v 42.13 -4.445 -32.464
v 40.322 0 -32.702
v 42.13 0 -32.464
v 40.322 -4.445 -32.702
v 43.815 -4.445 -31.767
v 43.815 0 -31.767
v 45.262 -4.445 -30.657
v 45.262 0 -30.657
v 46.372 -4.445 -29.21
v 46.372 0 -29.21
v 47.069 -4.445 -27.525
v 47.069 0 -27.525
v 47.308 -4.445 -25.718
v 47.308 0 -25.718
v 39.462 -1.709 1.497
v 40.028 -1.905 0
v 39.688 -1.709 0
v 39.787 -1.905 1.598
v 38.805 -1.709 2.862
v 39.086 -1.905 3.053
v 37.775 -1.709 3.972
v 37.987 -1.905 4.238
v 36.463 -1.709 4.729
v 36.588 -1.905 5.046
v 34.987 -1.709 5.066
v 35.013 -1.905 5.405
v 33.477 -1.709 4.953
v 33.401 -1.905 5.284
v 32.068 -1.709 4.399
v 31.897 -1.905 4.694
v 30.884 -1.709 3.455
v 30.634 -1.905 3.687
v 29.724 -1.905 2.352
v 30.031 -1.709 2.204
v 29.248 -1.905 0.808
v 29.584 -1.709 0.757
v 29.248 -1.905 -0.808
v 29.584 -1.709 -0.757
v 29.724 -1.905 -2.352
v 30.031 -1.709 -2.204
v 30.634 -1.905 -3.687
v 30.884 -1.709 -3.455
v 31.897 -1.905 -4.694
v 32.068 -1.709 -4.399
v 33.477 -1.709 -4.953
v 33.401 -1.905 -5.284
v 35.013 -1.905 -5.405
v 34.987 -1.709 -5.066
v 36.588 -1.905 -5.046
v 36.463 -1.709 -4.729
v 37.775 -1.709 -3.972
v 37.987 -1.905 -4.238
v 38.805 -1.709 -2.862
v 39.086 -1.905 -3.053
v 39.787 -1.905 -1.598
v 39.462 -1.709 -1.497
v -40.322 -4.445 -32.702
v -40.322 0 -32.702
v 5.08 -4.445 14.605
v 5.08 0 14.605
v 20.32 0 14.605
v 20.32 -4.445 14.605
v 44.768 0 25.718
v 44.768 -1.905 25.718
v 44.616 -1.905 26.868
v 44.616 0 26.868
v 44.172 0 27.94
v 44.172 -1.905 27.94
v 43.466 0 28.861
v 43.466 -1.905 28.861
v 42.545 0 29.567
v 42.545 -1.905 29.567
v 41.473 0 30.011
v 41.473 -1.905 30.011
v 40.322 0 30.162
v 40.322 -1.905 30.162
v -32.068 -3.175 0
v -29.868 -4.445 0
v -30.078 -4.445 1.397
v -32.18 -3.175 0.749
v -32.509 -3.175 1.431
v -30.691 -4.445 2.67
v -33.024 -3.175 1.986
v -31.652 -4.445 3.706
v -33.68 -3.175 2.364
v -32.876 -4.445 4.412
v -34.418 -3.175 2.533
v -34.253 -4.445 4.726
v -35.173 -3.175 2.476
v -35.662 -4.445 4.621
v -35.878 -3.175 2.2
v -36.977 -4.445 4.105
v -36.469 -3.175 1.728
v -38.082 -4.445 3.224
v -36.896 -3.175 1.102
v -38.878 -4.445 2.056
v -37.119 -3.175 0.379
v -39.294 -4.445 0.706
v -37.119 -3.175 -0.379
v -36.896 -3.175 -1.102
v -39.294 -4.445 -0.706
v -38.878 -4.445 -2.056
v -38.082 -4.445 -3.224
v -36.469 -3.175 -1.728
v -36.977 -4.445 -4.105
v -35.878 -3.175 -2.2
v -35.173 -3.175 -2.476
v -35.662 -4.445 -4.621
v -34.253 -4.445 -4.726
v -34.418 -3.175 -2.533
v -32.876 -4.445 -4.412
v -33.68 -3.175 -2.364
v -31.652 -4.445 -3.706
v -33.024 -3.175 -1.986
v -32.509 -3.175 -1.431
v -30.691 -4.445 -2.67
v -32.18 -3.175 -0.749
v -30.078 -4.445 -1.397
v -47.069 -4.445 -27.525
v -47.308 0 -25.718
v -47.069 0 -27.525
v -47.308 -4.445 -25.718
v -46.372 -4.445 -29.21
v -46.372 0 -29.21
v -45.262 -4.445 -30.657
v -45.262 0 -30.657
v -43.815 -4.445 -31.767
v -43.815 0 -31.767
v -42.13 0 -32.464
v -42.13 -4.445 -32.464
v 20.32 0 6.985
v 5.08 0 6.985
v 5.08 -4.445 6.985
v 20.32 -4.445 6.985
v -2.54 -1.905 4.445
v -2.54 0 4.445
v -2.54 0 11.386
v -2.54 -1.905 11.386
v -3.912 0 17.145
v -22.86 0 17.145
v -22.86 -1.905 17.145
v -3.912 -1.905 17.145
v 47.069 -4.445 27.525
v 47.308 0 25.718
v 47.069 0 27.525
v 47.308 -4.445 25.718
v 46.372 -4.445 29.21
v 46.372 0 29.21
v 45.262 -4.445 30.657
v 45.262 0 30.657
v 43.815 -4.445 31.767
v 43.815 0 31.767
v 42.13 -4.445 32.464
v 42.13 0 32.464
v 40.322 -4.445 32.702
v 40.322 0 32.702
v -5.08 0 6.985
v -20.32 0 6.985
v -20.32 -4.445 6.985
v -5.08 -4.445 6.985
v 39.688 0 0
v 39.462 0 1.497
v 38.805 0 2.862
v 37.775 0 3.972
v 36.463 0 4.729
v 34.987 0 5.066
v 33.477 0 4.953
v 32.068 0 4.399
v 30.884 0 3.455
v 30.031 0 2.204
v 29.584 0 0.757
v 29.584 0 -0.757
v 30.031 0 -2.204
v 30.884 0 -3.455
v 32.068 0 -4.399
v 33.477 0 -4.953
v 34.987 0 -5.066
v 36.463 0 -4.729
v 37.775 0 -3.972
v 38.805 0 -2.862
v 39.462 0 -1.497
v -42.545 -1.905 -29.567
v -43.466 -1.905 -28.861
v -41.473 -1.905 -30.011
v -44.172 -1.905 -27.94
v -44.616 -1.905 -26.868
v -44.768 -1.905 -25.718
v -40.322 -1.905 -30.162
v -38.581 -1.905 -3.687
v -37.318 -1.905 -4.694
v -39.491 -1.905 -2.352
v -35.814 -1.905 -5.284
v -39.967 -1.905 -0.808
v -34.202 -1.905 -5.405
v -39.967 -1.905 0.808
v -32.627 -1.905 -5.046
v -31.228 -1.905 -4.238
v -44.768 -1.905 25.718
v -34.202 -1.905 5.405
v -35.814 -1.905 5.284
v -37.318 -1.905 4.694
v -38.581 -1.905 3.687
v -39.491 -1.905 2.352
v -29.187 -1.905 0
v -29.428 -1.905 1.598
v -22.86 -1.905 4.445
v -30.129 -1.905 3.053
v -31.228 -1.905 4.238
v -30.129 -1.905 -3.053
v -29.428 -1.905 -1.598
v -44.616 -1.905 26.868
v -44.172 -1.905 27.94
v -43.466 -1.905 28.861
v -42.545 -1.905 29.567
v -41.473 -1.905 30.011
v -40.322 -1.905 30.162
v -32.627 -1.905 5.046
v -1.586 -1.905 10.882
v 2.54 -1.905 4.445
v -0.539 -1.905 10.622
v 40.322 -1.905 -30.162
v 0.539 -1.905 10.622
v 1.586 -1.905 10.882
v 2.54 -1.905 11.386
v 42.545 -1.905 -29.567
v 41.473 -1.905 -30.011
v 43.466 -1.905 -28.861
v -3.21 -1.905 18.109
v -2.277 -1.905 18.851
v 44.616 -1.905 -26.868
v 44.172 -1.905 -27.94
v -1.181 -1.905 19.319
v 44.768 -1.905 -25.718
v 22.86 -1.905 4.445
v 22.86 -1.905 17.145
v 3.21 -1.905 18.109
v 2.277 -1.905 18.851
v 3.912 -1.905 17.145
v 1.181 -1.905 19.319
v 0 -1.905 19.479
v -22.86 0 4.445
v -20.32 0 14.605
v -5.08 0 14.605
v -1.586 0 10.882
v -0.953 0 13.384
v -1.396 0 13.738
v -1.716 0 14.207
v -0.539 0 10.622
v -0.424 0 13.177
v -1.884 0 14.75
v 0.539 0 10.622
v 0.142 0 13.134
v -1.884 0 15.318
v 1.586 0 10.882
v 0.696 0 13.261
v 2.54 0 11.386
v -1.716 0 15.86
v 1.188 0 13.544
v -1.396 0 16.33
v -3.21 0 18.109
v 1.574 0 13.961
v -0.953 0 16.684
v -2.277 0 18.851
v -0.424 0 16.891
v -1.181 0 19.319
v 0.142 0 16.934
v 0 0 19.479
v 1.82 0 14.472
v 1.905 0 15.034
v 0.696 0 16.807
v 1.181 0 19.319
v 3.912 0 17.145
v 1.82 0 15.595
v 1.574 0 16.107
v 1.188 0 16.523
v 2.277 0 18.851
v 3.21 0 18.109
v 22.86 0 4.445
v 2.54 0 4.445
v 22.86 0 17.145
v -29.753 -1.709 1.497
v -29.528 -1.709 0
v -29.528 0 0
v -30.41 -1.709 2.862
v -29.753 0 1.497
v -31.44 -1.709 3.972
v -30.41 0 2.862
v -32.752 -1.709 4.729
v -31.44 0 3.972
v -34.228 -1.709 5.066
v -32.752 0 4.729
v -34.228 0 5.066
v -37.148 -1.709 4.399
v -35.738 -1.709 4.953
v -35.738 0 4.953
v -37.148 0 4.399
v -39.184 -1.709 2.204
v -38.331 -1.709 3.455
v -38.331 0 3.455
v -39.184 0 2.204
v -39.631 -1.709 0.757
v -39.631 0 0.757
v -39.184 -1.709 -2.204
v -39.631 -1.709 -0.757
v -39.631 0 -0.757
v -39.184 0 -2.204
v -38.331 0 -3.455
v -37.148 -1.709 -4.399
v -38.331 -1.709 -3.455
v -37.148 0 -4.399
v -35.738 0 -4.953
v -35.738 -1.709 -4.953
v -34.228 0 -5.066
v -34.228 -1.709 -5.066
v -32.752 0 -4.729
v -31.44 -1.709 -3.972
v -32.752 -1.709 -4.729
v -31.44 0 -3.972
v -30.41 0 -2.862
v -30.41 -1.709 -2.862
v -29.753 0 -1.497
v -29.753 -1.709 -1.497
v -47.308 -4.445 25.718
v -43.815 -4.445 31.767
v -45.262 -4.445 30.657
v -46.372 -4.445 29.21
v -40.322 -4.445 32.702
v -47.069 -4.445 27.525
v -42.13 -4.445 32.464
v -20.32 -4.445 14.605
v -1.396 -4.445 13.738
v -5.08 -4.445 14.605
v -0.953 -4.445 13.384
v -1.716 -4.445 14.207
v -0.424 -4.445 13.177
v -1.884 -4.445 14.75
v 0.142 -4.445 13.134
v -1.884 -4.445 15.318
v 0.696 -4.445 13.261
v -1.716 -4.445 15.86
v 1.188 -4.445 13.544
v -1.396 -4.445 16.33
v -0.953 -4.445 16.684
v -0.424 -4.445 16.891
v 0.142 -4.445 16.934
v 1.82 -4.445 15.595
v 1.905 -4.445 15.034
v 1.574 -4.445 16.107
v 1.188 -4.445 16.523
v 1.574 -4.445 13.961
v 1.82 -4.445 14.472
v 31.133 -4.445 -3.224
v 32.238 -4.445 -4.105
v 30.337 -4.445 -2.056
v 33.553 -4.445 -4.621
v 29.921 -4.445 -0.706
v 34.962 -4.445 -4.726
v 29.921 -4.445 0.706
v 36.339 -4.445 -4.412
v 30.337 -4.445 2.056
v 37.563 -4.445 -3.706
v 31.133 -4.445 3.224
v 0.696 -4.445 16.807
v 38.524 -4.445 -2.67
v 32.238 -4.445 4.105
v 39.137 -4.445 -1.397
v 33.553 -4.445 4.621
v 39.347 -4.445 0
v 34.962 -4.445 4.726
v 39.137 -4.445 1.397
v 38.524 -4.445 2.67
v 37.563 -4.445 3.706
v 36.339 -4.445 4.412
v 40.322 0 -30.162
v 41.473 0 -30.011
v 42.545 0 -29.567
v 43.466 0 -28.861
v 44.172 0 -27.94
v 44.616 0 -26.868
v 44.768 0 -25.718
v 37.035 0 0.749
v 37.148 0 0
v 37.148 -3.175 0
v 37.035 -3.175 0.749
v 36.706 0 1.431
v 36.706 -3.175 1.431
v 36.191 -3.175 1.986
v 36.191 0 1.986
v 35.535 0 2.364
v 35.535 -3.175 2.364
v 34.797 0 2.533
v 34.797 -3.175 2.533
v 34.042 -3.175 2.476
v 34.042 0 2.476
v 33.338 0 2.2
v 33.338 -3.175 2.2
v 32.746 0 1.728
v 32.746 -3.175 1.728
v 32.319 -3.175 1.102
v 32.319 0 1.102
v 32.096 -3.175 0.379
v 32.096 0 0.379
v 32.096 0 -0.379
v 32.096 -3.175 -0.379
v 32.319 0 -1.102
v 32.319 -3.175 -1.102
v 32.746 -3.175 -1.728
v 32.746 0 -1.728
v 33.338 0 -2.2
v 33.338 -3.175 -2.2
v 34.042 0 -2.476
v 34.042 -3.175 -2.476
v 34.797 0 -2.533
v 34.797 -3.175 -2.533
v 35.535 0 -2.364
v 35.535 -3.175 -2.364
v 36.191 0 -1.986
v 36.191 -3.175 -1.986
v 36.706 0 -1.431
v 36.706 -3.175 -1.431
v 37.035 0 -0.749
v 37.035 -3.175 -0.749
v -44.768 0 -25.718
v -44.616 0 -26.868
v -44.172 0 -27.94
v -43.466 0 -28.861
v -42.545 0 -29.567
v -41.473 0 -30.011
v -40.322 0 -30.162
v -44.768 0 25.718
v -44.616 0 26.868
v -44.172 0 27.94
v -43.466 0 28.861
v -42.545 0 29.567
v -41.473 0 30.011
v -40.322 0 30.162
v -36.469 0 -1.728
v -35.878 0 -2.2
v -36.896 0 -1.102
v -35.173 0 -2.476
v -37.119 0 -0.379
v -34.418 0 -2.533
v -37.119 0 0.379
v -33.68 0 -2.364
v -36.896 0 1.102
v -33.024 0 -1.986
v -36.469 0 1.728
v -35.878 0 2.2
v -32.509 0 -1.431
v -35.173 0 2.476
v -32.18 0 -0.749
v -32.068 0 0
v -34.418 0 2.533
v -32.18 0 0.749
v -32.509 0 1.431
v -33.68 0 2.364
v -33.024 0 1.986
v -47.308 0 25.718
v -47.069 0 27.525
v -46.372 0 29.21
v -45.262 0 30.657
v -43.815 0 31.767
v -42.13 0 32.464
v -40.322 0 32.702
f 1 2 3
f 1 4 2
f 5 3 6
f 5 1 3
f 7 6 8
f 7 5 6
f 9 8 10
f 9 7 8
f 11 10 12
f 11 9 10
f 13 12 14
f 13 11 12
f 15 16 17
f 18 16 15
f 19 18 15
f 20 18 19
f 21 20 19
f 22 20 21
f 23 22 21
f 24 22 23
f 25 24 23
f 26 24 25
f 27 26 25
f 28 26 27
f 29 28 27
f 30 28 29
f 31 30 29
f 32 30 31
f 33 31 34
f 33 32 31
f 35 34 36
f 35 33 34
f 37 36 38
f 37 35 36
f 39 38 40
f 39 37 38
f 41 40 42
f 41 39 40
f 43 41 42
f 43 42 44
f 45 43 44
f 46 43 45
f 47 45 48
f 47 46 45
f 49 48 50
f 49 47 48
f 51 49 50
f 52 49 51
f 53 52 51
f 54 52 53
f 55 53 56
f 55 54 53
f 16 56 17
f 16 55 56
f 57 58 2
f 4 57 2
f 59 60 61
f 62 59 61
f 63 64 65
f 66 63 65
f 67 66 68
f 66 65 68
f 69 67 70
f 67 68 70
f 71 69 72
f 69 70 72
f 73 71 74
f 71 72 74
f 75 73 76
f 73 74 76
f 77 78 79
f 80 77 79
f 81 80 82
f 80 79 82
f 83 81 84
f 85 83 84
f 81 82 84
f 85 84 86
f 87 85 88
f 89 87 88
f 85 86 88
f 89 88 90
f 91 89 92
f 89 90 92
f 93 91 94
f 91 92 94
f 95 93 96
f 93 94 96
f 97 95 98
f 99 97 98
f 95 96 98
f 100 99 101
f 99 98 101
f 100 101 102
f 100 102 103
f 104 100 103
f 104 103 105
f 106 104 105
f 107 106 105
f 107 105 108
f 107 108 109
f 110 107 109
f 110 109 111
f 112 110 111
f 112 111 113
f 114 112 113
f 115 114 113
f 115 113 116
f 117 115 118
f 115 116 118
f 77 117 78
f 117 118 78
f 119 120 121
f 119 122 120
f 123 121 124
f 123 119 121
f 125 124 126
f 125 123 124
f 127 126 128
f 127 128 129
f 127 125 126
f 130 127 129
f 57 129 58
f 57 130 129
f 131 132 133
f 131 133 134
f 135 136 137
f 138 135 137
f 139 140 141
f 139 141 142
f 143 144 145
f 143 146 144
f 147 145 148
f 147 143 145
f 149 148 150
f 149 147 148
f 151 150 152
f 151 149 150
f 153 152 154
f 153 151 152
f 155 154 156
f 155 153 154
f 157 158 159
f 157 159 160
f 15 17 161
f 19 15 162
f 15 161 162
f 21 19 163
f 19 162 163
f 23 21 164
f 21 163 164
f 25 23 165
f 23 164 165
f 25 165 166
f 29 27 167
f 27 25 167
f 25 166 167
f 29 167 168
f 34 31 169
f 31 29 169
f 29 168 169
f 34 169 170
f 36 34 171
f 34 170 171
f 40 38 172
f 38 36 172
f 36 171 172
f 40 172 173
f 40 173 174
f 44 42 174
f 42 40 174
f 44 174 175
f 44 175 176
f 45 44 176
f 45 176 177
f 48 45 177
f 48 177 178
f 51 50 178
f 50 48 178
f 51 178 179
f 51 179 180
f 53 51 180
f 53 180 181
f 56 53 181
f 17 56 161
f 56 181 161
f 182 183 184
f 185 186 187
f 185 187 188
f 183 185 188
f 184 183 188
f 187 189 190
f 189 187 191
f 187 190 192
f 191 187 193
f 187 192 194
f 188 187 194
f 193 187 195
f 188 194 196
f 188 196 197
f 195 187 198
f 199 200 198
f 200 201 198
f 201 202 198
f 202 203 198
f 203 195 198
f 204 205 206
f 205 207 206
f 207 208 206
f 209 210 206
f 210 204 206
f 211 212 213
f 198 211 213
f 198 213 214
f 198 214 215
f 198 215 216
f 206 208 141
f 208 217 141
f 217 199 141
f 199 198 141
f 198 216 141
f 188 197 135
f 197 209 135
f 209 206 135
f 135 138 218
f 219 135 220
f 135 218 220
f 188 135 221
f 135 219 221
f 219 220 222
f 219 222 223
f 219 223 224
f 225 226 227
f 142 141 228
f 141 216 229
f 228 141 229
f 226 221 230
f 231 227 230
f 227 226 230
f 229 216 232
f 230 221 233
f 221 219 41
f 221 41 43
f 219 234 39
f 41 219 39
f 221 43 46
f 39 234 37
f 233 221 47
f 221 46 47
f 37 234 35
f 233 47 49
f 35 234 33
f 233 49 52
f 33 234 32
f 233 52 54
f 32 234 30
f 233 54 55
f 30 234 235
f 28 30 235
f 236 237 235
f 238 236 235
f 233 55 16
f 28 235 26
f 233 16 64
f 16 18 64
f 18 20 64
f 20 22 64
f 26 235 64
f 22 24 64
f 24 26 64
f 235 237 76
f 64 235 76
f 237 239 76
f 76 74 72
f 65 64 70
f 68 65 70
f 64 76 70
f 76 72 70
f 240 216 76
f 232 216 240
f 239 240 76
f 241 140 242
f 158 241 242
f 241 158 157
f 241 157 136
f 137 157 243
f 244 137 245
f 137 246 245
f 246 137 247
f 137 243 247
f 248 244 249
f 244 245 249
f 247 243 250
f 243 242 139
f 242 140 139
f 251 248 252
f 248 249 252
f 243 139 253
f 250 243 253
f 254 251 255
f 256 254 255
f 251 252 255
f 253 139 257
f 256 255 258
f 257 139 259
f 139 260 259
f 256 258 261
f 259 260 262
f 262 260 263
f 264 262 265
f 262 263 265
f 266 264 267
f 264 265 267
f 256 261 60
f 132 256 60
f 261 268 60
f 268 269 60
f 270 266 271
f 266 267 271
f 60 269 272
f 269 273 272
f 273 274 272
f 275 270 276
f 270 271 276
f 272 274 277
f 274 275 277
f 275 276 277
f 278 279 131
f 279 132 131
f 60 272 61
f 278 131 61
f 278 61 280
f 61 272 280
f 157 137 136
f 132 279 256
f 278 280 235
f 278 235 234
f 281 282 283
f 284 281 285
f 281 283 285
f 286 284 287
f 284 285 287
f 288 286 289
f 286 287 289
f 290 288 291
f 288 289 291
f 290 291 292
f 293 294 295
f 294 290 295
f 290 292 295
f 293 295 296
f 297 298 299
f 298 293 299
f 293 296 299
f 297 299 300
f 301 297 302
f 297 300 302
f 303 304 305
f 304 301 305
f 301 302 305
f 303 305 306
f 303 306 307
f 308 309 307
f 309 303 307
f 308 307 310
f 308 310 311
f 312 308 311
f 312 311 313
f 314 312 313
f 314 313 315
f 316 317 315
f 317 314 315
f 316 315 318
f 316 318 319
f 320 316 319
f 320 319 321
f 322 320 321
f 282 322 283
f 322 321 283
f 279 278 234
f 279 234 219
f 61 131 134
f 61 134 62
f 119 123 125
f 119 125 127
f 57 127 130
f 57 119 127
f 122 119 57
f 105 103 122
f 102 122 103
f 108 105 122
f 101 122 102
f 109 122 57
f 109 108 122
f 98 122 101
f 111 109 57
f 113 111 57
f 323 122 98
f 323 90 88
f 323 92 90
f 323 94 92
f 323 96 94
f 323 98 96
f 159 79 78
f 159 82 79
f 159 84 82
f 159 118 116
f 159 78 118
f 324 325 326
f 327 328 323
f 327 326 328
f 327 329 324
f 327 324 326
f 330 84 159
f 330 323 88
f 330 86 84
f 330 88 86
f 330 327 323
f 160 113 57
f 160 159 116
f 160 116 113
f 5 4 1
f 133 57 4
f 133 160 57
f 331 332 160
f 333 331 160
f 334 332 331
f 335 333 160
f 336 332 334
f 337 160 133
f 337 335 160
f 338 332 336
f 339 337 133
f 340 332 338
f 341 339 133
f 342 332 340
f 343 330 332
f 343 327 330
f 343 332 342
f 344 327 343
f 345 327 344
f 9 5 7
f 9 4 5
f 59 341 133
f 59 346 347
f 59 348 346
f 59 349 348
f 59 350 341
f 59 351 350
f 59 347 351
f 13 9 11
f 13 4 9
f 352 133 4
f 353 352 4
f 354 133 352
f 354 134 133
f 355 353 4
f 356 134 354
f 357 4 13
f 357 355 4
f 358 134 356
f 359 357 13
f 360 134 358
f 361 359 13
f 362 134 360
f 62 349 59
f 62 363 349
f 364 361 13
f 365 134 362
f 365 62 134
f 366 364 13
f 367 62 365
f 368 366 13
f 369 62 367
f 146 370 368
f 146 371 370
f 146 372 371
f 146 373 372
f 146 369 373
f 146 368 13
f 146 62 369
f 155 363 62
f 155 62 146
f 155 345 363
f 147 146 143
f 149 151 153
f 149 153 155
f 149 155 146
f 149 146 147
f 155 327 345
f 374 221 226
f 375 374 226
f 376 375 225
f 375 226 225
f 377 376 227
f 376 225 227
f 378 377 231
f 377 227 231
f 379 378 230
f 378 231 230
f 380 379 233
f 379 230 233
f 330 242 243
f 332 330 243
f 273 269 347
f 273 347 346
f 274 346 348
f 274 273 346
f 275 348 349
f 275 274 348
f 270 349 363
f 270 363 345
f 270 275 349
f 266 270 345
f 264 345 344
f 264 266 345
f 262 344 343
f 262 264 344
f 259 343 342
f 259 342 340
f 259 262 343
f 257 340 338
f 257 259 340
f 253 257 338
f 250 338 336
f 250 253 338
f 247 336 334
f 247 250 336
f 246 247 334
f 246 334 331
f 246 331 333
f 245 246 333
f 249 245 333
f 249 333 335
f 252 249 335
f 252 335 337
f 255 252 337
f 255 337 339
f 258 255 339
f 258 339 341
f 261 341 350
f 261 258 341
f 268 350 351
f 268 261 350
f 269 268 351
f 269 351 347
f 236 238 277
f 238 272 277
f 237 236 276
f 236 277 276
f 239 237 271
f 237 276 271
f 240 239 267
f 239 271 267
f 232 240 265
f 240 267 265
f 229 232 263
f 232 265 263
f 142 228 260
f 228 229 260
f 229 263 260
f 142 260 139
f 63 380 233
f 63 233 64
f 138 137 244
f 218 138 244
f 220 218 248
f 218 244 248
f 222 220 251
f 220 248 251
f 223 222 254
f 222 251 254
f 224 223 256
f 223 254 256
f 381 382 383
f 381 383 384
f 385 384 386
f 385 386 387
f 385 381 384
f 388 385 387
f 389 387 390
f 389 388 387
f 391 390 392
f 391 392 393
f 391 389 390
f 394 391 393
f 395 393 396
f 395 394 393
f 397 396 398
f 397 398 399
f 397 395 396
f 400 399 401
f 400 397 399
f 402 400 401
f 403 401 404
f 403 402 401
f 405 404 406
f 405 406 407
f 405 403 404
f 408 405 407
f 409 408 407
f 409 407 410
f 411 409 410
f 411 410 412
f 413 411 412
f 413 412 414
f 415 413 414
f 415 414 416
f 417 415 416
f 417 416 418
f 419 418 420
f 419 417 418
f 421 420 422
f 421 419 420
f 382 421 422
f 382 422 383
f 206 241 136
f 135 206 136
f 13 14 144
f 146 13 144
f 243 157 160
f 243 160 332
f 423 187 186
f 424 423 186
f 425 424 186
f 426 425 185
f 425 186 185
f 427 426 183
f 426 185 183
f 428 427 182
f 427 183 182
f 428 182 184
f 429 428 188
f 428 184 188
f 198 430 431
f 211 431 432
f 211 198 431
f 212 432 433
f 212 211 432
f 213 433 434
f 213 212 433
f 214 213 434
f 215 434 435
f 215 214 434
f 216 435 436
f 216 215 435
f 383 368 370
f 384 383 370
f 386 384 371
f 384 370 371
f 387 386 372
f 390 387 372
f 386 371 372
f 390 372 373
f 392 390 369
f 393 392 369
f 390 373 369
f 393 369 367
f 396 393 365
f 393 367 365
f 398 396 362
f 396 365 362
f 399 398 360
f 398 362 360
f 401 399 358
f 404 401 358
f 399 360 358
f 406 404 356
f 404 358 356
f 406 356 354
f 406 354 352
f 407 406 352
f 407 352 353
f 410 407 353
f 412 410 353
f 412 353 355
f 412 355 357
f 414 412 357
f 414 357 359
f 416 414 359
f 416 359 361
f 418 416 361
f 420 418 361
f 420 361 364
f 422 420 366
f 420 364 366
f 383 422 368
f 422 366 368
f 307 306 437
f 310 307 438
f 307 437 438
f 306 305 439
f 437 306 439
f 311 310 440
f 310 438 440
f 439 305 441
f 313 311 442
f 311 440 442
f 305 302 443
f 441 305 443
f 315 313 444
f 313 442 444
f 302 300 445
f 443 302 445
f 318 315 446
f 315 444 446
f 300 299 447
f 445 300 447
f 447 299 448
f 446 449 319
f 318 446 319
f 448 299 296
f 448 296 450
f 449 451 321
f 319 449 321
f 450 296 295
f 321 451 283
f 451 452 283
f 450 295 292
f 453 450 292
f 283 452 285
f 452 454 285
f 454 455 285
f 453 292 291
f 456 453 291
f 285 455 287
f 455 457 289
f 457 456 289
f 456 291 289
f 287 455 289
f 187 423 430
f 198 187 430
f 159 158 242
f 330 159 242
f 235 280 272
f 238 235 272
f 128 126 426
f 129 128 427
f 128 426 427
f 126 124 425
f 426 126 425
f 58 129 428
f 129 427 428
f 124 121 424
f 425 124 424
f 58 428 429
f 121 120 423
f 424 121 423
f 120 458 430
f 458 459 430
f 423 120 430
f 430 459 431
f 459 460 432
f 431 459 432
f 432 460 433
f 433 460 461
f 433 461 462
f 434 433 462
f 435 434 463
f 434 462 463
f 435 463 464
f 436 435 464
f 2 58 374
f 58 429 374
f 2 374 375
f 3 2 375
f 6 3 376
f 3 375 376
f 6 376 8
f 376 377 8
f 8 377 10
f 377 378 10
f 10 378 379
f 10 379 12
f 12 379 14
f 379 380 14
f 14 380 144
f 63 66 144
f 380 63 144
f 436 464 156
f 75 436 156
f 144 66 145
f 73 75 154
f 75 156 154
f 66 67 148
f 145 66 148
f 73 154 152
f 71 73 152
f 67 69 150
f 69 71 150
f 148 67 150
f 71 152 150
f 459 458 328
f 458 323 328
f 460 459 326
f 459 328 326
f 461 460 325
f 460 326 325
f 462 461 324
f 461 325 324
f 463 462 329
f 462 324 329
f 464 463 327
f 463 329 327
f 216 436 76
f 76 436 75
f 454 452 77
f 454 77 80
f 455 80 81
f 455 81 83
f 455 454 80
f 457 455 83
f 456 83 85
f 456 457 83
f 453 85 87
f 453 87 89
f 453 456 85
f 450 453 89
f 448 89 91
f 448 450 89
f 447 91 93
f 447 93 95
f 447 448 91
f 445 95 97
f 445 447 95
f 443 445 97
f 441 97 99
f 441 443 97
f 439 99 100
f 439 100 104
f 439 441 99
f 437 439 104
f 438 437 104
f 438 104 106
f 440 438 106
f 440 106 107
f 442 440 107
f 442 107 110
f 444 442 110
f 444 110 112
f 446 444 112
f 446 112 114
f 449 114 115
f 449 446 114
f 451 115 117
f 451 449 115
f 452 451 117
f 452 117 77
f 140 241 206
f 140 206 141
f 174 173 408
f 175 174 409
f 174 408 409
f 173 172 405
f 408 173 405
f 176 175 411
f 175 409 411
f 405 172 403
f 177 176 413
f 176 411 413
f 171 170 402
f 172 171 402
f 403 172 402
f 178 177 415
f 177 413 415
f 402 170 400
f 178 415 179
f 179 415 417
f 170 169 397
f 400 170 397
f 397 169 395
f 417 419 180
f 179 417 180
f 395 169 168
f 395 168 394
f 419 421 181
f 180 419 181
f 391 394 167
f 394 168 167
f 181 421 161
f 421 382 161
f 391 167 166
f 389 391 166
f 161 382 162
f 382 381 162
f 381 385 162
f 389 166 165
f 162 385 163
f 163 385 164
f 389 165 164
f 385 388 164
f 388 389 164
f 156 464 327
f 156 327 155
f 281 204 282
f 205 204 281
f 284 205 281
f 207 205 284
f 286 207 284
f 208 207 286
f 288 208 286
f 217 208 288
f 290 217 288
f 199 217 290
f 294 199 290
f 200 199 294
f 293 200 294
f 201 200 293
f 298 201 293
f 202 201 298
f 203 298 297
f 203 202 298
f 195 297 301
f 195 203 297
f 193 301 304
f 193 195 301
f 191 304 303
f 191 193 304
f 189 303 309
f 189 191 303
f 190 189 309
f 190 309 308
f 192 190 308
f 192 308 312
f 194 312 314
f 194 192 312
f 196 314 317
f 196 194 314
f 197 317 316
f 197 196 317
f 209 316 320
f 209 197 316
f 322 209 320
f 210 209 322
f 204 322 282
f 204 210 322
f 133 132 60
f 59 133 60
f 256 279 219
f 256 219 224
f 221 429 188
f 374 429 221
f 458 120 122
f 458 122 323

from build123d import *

# Parameters (mm, degrees)
F0_W        = 94.615
F0_H        = 65.405
F0_W_2      = 86.9950006521
F0_H_2      = 57.7850006521
F0_R        = 5.08
F0_R_2      = 2.413
F0_W_3      = 15.24
F0_H_3      = 7.62
F0_R_3      = 1.905
F0_R_4      = 2.54
F0_R_5      = 1.143
F0_W_4      = 7.112
F0_H_4      = 1.016
F1_DEPTH    = 4.445
F2_R        = 6.985
F3_SIZE2    = 2.1997045256
F3_SIZE     = 1.27
F3_2_SIZE2  = 2.1997045256
F3_2_SIZE   = 1.27
F4_T        = 2.54
F4_T3_DEPTH = 9.525


# Not quite as in the source:
# - a shell that OpenCascade refuses in one call is made with other operations: the cavity is built on its own and cut out


with BuildPart() as f1:
    # F0 (on Front) → F1 (new body)
    with BuildSketch(Plane.XZ):
        Rectangle(F0_W, F0_H)
        Rectangle(F0_W_2, F0_H_2, mode=Mode.SUBTRACT)
        Rectangle(F0_W_2, F0_H_2)
        with Locations((-34.6075, 0)):
            Circle(F0_R, mode=Mode.SUBTRACT)
        Polygon((24.765, 23.495), (24.765, -23.495), (3.556, -23.495), (-3.556, -23.495), (-24.765, -23.495), (-24.765, 23.495), align=None, mode=Mode.SUBTRACT)
        with Locations((34.6075, 0)):
            Circle(F0_R, mode=Mode.SUBTRACT)
        Polygon((-3.556, -22.479), (3.556, -22.479), (23.749, -22.479), (23.749, 22.479), (-23.749, 22.479), (-23.749, -22.479), align=None)
        with Locations((-19.685, -18.0975)):
            Circle(F0_R_2, mode=Mode.SUBTRACT)
        with Locations((19.685, -18.0975)):
            Circle(F0_R_2, mode=Mode.SUBTRACT)
        with Locations((-12.7, 10.795)):
            Rectangle(F0_W_3, F0_H_3, mode=Mode.SUBTRACT)
        with Locations((-19.685, 18.0975)):
            Circle(F0_R_2, mode=Mode.SUBTRACT)
        with Locations((0, 15.0338392705)):
            Circle(F0_R_3, mode=Mode.SUBTRACT)
        with Locations((12.7, 10.795)):
            Rectangle(F0_W_3, F0_H_3, mode=Mode.SUBTRACT)
        with Locations((19.685, 18.0975)):
            Circle(F0_R_2, mode=Mode.SUBTRACT)
        Polygon((3.556, -23.495), (24.765, -23.495), (24.765, 23.495), (-24.765, 23.495), (-24.765, -23.495), (-3.556, -23.495), (-3.556, -22.479), (-23.749, -22.479), (-23.749, 22.479), (23.749, 22.479), (23.749, -22.479), (3.556, -22.479), align=None)
        with Locations((34.6075, 0)):
            Circle(F0_R)
        with Locations((34.6075, 0)):
            Circle(F0_R_4, mode=Mode.SUBTRACT)
        with Locations((-34.6075, 0)):
            Circle(F0_R)
        with Locations((-34.6075, 0)):
            Circle(F0_R_4, mode=Mode.SUBTRACT)
        with Locations((-19.685, 18.0975)):
            Circle(F0_R_2)
        with Locations((-19.685, 18.0975)):
            Circle(F0_R_5, mode=Mode.SUBTRACT)
        with Locations((-19.685, -18.0975)):
            Circle(F0_R_2)
        with Locations((-19.685, -18.0975)):
            Circle(F0_R_5, mode=Mode.SUBTRACT)
        with Locations((19.685, -18.0975)):
            Circle(F0_R_2)
        with Locations((19.685, -18.0975)):
            Circle(F0_R_5, mode=Mode.SUBTRACT)
        with Locations((19.685, 18.0975)):
            Circle(F0_R_2)
        with Locations((19.685, 18.0975)):
            Circle(F0_R_5, mode=Mode.SUBTRACT)
        with Locations((0, -22.987)):
            Rectangle(F0_W_4, F0_H_4)
        with Locations((-19.685, 18.0975)):
            Circle(F0_R_5)
        with Locations((-19.685, -18.0975)):
            Circle(F0_R_5)
        with Locations((19.685, -18.0975)):
            Circle(F0_R_5)
        with Locations((19.685, 18.0975)):
            Circle(F0_R_5)
    extrude(amount=F1_DEPTH)

    # F2
    f2_edges = [f1.edges().sort_by_distance(p)[0] for p in [
        (-47.3075, -2.2225, 32.7025),
        (-47.3075, -2.2225, -32.7025),
        (47.3075, -2.2225, 32.7025),
        (47.3075, -2.2225, -32.7025),
    ]]
    fillet(f2_edges, radius=F2_R)

    # F3
    f3_edges = [f1.edges().sort_by_distance(p)[0] for p in [
        (-37.1475, -4.445, 0),
    ]]
    f3_side = f1.faces().sort_by_distance((-37.1475, -2.2225, 0))[0]
    chamfer(f3_edges, length=F3_SIZE, length2=F3_SIZE2, reference=f3_side)

    # F3#2
    f3_2_edges = [f1.edges().sort_by_distance(p)[0] for p in [
        (32.0675, -4.445, 0),
    ]]
    f3_2_side = f1.faces().sort_by_distance((32.0675, -2.2225, 0))[0]
    chamfer(f3_2_edges, length=F3_2_SIZE, length2=F3_2_SIZE2, reference=f3_2_side)

    # F4: shell of thickness 2.54, made by hand


with BuildPart() as f4_core1:
    # F4_t2: copy of F1
    add(f1.part)

    # the walls: a layer under each face that stays
    f4_faces = [f4_core1.faces().sort_by_distance(p)[0] for p in [
        (0, -4.445, 0),
        (30.9676477372, -3.81, 0),
        (-38.2473522628, -3.81, 0),
        (0, -2.2225, -32.7025),
        (-45.2616408666, -2.2225, -30.6566408666),
        (45.2616408666, -2.2225, -30.6566408666),
        (-47.3075, -2.2225, 0),
        (47.3075, -2.2225, 0),
        (-45.2616408666, -2.2225, 30.6566408666),
        (45.2616408666, -2.2225, 30.6566408666),
        (0, -2.2225, 32.7025),
        (20.32, -2.2225, 10.795),
        (12.7, -2.2225, 6.985),
        (5.08, -2.2225, 10.795),
        (12.7, -2.2225, 14.605),
        (-12.7, -2.2225, 6.985),
        (-20.32, -2.2225, 10.795),
        (-12.7, -2.2225, 14.605),
        (-5.08, -2.2225, 10.795),
        (-1.905, -2.2225, 15.0338392705),
        (32.0675, -1.5875, 0),
        (-37.1475, -1.5875, 0),
    ]]
    thicken(f4_faces, amount=-F4_T, mode=Mode.SUBTRACT)

    # F4_s4 → F4_t3 (cut)
    with BuildSketch(Plane.XZ.offset(-2.54)):
        Polygon((20.2946, 14.5796), (22.86, 14.605), (22.86, 17.145), (20.32, 17.145), align=None)
        Polygon((20.2946, 7.0104), (22.86, 6.985), (22.86, 4.445), (20.32, 4.445), align=None)
        Polygon((5.1054, 7.0104), (5.08, 4.445), (2.54, 4.445), (2.54, 6.985), align=None)
        Polygon((5.1054, 14.5796), (2.54, 14.605), (2.54, 17.145), (5.08, 17.145), align=None)
        Polygon((-5.1054, 7.0104), (-5.08, 4.445), (-2.54, 4.445), (-2.54, 6.985), align=None)
        Polygon((-20.2946, 7.0104), (-20.32, 4.445), (-22.86, 4.445), (-22.86, 6.985), align=None)
        Polygon((-20.2946, 14.5796), (-22.86, 14.605), (-22.86, 17.145), (-20.32, 17.145), align=None)
        Polygon((-5.1054, 14.5796), (-5.08, 17.145), (-2.54, 17.145), (-2.54, 14.605), align=None)
    extrude(amount=F4_T3_DEPTH, mode=Mode.SUBTRACT)


with BuildPart() as f1_1:
    add(f1.part)

    # what is left inside the walls is the cavity
    f4_cavity = [f4_core1.part.solids().sort_by_distance(p)[0] for p in [
        (0, -0.0254, -10.054167),
    ]]
    add(f4_cavity, mode=Mode.SUBTRACT)


solid = f1_1.part
